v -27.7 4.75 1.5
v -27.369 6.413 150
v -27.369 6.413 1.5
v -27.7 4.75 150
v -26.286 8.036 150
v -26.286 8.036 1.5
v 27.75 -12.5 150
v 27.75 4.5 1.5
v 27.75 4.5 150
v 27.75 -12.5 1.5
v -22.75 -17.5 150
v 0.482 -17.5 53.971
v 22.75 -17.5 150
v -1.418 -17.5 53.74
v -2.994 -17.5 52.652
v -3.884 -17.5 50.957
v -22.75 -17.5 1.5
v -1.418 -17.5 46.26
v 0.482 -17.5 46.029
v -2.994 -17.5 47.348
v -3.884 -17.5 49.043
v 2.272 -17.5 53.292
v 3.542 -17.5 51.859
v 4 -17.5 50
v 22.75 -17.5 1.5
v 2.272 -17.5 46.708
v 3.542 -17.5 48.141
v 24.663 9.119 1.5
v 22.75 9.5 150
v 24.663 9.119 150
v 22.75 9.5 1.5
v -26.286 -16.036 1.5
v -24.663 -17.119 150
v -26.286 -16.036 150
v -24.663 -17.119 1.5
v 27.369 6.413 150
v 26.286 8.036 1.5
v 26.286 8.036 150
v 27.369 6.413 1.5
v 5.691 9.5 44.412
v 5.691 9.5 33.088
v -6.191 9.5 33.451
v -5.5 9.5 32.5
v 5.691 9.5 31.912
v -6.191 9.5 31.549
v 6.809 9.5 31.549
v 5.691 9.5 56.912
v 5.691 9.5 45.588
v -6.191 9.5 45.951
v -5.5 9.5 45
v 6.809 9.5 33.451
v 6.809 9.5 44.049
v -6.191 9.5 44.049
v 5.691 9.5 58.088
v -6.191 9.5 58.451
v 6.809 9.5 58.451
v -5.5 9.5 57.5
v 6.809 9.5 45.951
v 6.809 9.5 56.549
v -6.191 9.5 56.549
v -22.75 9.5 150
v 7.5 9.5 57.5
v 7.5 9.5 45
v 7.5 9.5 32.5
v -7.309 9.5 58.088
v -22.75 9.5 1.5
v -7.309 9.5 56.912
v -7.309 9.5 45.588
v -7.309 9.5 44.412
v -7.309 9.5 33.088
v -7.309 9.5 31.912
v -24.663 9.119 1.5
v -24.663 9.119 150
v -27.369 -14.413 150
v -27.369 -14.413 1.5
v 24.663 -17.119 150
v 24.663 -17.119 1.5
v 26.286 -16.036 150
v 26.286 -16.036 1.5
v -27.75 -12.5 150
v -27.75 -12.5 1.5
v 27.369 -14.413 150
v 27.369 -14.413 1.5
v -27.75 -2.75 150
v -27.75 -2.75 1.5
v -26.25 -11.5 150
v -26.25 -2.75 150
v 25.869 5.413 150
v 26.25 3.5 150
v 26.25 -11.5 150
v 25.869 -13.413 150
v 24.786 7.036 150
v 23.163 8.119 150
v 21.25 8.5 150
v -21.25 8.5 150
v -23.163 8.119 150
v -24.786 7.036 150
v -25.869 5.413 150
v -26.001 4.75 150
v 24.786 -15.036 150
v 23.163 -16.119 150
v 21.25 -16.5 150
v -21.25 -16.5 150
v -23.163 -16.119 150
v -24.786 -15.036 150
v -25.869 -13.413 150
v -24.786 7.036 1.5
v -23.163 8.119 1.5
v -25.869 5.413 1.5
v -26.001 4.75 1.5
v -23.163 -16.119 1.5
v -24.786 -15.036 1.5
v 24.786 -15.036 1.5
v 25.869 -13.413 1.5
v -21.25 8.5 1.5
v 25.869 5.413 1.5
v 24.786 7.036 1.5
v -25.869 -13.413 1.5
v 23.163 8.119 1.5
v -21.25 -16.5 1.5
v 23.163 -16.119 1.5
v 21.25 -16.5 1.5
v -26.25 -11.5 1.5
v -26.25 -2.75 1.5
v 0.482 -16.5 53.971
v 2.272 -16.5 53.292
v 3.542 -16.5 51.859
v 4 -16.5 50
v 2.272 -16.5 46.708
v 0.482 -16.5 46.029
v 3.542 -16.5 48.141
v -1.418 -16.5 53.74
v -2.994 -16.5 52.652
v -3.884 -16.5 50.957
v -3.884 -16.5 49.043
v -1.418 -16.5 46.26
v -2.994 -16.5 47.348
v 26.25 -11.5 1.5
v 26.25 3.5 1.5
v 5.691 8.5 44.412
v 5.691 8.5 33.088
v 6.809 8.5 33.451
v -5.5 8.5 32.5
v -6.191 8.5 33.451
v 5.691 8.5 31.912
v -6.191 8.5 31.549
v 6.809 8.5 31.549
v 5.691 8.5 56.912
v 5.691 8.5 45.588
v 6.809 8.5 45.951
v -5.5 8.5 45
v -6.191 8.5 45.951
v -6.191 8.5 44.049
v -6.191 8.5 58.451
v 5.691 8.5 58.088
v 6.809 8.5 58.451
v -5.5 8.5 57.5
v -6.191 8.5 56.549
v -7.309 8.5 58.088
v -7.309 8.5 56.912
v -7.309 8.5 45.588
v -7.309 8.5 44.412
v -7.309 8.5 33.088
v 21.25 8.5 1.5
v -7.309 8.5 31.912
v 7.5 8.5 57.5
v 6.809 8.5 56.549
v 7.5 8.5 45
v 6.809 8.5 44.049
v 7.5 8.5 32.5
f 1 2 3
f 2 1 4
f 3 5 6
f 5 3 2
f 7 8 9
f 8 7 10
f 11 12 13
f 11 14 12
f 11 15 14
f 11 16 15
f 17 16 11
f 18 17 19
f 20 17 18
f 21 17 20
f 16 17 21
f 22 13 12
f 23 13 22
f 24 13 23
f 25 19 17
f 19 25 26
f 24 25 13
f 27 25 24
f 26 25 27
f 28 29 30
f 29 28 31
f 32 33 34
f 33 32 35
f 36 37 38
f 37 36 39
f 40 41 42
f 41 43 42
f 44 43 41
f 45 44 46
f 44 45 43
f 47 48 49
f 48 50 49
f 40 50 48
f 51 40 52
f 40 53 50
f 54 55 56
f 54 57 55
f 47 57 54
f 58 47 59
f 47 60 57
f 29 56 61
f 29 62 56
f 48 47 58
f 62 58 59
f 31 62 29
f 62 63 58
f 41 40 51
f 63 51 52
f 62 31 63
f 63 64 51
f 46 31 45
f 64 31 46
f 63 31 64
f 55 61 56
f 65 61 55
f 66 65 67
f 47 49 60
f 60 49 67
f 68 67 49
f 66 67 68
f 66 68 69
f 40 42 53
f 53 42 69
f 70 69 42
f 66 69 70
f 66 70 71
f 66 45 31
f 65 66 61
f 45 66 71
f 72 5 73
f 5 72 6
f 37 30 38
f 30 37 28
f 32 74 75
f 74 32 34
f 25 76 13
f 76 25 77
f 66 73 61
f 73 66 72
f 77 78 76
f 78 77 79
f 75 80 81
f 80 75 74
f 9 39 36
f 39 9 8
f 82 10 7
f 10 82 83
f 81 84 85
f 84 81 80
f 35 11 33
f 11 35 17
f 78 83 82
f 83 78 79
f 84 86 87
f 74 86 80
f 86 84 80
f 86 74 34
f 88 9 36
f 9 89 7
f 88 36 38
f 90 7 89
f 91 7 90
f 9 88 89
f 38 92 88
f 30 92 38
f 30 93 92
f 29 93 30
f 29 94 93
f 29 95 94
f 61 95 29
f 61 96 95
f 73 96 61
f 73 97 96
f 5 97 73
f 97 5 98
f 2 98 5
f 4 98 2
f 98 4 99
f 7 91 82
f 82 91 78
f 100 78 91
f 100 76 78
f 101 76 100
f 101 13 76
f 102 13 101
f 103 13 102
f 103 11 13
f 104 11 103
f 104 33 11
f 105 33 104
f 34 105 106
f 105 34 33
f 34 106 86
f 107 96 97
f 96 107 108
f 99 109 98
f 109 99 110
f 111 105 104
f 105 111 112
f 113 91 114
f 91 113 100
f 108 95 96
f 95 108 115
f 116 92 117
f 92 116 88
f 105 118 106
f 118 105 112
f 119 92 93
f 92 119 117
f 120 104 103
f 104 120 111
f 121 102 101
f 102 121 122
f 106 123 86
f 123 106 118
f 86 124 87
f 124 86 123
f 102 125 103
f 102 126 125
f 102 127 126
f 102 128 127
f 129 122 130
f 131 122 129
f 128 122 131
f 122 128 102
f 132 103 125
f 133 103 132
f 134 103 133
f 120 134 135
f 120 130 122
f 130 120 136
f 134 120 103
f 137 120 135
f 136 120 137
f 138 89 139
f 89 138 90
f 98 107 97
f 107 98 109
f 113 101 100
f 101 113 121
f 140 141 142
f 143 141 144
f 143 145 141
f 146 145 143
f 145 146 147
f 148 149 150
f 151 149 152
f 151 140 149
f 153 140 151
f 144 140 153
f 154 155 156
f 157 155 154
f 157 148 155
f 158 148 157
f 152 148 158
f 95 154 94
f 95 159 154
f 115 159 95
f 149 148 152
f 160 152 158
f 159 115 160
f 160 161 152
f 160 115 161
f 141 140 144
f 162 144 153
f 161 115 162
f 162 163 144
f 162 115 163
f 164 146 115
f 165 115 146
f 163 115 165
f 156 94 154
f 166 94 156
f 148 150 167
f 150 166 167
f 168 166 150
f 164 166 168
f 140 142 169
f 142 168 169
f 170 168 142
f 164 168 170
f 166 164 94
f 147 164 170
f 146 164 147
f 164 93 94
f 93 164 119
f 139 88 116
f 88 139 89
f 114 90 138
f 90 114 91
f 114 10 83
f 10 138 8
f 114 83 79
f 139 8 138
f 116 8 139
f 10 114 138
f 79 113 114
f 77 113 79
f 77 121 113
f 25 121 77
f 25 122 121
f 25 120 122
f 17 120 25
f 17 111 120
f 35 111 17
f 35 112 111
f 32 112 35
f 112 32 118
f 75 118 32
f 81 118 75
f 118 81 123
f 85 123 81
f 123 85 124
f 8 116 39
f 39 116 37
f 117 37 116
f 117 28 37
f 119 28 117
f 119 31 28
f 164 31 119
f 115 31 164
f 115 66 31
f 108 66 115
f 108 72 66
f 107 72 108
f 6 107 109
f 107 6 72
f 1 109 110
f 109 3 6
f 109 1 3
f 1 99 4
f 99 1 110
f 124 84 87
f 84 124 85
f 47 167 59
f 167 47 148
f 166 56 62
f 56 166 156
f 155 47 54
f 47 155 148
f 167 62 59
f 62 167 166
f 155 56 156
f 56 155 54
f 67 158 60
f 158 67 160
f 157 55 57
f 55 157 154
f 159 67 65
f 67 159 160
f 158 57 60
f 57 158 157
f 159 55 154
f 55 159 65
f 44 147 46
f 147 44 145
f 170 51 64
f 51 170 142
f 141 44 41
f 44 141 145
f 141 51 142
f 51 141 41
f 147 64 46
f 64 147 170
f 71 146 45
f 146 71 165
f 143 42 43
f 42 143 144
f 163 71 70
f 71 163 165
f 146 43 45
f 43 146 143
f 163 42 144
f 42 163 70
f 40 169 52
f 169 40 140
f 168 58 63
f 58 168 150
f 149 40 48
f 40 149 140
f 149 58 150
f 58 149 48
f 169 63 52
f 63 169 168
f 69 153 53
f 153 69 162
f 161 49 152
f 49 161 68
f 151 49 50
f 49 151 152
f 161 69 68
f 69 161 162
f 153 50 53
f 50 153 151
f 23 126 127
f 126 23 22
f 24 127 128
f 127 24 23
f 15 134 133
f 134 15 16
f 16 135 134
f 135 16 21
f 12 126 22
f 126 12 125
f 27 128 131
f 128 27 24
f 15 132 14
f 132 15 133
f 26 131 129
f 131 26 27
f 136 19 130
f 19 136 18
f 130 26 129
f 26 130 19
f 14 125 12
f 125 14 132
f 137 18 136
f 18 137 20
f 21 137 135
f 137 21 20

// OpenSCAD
difference() {
    // Outer volume
    hull(){
        translate([-22.75,4.5,0]) cylinder(r=5,h=150);
        translate([-22.75,-12.5,0]) cylinder(r=5,h=150);
        translate([22.75,-12.5,0]) cylinder(r=5,h=150);
        translate([22.75,4.5,0]) cylinder(r=5,h=150);
    }

    // Inner space
    hull(){
        translate([-21.25,3.5,1]) cylinder(r=5,h=150);
        translate([-21.25,-11.5,1]) cylinder(r=5,h=150);
        translate([21.25,-11.5,1]) cylinder(r=5,h=150);
        translate([21.25,3.5,1]) cylinder(r=5,h=150);
    }
    
    // Bottom opening
    translate([0,-4,0]) scale([60,40,3]) cube(1,1,1,center=true);
    
    // Servo lever opening
    translate([-24,1,80]) scale([9.5,7.5,200]) cube(1,1,1,center=true);
    
    //translate([0,8.5,13.5+32]) scale([13.5,5.5,25]) cube(1,1,1,center=true);
    
    // Servo mount cut points
    translate([6.5,10,57.5]) rotate([90,0,0]) cylinder(r = 1, h = 10, center = true);
    translate([-6.5,10,57.5]) rotate([90,0,0]) cylinder(r = 1, h = 10, center = true);
    translate([6.5,10,32.5]) rotate([90,0,0]) cylinder(r = 1, h = 10, center = true);
    translate([-6.5,10,32.5]) rotate([90,0,0]) cylinder(r = 1, h = 10, center = true);
    translate([6.5,10,45]) rotate([90,0,0]) cylinder(r = 1, h = 10, center = true);
    translate([-6.5,10,45]) rotate([90,0,0]) cylinder(r = 1, h = 10, center = true);
    
    // Servo lever screwing point
    translate([0,-10,50]) rotate([90,0,0]) cylinder(r = 4, h = 30, center = true);
    
}


module fillet(r, h) {
    translate([r / 2, r / 2, 0])

        difference() {
            cube([r + 0.01, r + 0.01, h], center = true);

            translate([r/2, r/2, 0])
                cylinder(r = r, h = h + 1, center = true);

        }
}
